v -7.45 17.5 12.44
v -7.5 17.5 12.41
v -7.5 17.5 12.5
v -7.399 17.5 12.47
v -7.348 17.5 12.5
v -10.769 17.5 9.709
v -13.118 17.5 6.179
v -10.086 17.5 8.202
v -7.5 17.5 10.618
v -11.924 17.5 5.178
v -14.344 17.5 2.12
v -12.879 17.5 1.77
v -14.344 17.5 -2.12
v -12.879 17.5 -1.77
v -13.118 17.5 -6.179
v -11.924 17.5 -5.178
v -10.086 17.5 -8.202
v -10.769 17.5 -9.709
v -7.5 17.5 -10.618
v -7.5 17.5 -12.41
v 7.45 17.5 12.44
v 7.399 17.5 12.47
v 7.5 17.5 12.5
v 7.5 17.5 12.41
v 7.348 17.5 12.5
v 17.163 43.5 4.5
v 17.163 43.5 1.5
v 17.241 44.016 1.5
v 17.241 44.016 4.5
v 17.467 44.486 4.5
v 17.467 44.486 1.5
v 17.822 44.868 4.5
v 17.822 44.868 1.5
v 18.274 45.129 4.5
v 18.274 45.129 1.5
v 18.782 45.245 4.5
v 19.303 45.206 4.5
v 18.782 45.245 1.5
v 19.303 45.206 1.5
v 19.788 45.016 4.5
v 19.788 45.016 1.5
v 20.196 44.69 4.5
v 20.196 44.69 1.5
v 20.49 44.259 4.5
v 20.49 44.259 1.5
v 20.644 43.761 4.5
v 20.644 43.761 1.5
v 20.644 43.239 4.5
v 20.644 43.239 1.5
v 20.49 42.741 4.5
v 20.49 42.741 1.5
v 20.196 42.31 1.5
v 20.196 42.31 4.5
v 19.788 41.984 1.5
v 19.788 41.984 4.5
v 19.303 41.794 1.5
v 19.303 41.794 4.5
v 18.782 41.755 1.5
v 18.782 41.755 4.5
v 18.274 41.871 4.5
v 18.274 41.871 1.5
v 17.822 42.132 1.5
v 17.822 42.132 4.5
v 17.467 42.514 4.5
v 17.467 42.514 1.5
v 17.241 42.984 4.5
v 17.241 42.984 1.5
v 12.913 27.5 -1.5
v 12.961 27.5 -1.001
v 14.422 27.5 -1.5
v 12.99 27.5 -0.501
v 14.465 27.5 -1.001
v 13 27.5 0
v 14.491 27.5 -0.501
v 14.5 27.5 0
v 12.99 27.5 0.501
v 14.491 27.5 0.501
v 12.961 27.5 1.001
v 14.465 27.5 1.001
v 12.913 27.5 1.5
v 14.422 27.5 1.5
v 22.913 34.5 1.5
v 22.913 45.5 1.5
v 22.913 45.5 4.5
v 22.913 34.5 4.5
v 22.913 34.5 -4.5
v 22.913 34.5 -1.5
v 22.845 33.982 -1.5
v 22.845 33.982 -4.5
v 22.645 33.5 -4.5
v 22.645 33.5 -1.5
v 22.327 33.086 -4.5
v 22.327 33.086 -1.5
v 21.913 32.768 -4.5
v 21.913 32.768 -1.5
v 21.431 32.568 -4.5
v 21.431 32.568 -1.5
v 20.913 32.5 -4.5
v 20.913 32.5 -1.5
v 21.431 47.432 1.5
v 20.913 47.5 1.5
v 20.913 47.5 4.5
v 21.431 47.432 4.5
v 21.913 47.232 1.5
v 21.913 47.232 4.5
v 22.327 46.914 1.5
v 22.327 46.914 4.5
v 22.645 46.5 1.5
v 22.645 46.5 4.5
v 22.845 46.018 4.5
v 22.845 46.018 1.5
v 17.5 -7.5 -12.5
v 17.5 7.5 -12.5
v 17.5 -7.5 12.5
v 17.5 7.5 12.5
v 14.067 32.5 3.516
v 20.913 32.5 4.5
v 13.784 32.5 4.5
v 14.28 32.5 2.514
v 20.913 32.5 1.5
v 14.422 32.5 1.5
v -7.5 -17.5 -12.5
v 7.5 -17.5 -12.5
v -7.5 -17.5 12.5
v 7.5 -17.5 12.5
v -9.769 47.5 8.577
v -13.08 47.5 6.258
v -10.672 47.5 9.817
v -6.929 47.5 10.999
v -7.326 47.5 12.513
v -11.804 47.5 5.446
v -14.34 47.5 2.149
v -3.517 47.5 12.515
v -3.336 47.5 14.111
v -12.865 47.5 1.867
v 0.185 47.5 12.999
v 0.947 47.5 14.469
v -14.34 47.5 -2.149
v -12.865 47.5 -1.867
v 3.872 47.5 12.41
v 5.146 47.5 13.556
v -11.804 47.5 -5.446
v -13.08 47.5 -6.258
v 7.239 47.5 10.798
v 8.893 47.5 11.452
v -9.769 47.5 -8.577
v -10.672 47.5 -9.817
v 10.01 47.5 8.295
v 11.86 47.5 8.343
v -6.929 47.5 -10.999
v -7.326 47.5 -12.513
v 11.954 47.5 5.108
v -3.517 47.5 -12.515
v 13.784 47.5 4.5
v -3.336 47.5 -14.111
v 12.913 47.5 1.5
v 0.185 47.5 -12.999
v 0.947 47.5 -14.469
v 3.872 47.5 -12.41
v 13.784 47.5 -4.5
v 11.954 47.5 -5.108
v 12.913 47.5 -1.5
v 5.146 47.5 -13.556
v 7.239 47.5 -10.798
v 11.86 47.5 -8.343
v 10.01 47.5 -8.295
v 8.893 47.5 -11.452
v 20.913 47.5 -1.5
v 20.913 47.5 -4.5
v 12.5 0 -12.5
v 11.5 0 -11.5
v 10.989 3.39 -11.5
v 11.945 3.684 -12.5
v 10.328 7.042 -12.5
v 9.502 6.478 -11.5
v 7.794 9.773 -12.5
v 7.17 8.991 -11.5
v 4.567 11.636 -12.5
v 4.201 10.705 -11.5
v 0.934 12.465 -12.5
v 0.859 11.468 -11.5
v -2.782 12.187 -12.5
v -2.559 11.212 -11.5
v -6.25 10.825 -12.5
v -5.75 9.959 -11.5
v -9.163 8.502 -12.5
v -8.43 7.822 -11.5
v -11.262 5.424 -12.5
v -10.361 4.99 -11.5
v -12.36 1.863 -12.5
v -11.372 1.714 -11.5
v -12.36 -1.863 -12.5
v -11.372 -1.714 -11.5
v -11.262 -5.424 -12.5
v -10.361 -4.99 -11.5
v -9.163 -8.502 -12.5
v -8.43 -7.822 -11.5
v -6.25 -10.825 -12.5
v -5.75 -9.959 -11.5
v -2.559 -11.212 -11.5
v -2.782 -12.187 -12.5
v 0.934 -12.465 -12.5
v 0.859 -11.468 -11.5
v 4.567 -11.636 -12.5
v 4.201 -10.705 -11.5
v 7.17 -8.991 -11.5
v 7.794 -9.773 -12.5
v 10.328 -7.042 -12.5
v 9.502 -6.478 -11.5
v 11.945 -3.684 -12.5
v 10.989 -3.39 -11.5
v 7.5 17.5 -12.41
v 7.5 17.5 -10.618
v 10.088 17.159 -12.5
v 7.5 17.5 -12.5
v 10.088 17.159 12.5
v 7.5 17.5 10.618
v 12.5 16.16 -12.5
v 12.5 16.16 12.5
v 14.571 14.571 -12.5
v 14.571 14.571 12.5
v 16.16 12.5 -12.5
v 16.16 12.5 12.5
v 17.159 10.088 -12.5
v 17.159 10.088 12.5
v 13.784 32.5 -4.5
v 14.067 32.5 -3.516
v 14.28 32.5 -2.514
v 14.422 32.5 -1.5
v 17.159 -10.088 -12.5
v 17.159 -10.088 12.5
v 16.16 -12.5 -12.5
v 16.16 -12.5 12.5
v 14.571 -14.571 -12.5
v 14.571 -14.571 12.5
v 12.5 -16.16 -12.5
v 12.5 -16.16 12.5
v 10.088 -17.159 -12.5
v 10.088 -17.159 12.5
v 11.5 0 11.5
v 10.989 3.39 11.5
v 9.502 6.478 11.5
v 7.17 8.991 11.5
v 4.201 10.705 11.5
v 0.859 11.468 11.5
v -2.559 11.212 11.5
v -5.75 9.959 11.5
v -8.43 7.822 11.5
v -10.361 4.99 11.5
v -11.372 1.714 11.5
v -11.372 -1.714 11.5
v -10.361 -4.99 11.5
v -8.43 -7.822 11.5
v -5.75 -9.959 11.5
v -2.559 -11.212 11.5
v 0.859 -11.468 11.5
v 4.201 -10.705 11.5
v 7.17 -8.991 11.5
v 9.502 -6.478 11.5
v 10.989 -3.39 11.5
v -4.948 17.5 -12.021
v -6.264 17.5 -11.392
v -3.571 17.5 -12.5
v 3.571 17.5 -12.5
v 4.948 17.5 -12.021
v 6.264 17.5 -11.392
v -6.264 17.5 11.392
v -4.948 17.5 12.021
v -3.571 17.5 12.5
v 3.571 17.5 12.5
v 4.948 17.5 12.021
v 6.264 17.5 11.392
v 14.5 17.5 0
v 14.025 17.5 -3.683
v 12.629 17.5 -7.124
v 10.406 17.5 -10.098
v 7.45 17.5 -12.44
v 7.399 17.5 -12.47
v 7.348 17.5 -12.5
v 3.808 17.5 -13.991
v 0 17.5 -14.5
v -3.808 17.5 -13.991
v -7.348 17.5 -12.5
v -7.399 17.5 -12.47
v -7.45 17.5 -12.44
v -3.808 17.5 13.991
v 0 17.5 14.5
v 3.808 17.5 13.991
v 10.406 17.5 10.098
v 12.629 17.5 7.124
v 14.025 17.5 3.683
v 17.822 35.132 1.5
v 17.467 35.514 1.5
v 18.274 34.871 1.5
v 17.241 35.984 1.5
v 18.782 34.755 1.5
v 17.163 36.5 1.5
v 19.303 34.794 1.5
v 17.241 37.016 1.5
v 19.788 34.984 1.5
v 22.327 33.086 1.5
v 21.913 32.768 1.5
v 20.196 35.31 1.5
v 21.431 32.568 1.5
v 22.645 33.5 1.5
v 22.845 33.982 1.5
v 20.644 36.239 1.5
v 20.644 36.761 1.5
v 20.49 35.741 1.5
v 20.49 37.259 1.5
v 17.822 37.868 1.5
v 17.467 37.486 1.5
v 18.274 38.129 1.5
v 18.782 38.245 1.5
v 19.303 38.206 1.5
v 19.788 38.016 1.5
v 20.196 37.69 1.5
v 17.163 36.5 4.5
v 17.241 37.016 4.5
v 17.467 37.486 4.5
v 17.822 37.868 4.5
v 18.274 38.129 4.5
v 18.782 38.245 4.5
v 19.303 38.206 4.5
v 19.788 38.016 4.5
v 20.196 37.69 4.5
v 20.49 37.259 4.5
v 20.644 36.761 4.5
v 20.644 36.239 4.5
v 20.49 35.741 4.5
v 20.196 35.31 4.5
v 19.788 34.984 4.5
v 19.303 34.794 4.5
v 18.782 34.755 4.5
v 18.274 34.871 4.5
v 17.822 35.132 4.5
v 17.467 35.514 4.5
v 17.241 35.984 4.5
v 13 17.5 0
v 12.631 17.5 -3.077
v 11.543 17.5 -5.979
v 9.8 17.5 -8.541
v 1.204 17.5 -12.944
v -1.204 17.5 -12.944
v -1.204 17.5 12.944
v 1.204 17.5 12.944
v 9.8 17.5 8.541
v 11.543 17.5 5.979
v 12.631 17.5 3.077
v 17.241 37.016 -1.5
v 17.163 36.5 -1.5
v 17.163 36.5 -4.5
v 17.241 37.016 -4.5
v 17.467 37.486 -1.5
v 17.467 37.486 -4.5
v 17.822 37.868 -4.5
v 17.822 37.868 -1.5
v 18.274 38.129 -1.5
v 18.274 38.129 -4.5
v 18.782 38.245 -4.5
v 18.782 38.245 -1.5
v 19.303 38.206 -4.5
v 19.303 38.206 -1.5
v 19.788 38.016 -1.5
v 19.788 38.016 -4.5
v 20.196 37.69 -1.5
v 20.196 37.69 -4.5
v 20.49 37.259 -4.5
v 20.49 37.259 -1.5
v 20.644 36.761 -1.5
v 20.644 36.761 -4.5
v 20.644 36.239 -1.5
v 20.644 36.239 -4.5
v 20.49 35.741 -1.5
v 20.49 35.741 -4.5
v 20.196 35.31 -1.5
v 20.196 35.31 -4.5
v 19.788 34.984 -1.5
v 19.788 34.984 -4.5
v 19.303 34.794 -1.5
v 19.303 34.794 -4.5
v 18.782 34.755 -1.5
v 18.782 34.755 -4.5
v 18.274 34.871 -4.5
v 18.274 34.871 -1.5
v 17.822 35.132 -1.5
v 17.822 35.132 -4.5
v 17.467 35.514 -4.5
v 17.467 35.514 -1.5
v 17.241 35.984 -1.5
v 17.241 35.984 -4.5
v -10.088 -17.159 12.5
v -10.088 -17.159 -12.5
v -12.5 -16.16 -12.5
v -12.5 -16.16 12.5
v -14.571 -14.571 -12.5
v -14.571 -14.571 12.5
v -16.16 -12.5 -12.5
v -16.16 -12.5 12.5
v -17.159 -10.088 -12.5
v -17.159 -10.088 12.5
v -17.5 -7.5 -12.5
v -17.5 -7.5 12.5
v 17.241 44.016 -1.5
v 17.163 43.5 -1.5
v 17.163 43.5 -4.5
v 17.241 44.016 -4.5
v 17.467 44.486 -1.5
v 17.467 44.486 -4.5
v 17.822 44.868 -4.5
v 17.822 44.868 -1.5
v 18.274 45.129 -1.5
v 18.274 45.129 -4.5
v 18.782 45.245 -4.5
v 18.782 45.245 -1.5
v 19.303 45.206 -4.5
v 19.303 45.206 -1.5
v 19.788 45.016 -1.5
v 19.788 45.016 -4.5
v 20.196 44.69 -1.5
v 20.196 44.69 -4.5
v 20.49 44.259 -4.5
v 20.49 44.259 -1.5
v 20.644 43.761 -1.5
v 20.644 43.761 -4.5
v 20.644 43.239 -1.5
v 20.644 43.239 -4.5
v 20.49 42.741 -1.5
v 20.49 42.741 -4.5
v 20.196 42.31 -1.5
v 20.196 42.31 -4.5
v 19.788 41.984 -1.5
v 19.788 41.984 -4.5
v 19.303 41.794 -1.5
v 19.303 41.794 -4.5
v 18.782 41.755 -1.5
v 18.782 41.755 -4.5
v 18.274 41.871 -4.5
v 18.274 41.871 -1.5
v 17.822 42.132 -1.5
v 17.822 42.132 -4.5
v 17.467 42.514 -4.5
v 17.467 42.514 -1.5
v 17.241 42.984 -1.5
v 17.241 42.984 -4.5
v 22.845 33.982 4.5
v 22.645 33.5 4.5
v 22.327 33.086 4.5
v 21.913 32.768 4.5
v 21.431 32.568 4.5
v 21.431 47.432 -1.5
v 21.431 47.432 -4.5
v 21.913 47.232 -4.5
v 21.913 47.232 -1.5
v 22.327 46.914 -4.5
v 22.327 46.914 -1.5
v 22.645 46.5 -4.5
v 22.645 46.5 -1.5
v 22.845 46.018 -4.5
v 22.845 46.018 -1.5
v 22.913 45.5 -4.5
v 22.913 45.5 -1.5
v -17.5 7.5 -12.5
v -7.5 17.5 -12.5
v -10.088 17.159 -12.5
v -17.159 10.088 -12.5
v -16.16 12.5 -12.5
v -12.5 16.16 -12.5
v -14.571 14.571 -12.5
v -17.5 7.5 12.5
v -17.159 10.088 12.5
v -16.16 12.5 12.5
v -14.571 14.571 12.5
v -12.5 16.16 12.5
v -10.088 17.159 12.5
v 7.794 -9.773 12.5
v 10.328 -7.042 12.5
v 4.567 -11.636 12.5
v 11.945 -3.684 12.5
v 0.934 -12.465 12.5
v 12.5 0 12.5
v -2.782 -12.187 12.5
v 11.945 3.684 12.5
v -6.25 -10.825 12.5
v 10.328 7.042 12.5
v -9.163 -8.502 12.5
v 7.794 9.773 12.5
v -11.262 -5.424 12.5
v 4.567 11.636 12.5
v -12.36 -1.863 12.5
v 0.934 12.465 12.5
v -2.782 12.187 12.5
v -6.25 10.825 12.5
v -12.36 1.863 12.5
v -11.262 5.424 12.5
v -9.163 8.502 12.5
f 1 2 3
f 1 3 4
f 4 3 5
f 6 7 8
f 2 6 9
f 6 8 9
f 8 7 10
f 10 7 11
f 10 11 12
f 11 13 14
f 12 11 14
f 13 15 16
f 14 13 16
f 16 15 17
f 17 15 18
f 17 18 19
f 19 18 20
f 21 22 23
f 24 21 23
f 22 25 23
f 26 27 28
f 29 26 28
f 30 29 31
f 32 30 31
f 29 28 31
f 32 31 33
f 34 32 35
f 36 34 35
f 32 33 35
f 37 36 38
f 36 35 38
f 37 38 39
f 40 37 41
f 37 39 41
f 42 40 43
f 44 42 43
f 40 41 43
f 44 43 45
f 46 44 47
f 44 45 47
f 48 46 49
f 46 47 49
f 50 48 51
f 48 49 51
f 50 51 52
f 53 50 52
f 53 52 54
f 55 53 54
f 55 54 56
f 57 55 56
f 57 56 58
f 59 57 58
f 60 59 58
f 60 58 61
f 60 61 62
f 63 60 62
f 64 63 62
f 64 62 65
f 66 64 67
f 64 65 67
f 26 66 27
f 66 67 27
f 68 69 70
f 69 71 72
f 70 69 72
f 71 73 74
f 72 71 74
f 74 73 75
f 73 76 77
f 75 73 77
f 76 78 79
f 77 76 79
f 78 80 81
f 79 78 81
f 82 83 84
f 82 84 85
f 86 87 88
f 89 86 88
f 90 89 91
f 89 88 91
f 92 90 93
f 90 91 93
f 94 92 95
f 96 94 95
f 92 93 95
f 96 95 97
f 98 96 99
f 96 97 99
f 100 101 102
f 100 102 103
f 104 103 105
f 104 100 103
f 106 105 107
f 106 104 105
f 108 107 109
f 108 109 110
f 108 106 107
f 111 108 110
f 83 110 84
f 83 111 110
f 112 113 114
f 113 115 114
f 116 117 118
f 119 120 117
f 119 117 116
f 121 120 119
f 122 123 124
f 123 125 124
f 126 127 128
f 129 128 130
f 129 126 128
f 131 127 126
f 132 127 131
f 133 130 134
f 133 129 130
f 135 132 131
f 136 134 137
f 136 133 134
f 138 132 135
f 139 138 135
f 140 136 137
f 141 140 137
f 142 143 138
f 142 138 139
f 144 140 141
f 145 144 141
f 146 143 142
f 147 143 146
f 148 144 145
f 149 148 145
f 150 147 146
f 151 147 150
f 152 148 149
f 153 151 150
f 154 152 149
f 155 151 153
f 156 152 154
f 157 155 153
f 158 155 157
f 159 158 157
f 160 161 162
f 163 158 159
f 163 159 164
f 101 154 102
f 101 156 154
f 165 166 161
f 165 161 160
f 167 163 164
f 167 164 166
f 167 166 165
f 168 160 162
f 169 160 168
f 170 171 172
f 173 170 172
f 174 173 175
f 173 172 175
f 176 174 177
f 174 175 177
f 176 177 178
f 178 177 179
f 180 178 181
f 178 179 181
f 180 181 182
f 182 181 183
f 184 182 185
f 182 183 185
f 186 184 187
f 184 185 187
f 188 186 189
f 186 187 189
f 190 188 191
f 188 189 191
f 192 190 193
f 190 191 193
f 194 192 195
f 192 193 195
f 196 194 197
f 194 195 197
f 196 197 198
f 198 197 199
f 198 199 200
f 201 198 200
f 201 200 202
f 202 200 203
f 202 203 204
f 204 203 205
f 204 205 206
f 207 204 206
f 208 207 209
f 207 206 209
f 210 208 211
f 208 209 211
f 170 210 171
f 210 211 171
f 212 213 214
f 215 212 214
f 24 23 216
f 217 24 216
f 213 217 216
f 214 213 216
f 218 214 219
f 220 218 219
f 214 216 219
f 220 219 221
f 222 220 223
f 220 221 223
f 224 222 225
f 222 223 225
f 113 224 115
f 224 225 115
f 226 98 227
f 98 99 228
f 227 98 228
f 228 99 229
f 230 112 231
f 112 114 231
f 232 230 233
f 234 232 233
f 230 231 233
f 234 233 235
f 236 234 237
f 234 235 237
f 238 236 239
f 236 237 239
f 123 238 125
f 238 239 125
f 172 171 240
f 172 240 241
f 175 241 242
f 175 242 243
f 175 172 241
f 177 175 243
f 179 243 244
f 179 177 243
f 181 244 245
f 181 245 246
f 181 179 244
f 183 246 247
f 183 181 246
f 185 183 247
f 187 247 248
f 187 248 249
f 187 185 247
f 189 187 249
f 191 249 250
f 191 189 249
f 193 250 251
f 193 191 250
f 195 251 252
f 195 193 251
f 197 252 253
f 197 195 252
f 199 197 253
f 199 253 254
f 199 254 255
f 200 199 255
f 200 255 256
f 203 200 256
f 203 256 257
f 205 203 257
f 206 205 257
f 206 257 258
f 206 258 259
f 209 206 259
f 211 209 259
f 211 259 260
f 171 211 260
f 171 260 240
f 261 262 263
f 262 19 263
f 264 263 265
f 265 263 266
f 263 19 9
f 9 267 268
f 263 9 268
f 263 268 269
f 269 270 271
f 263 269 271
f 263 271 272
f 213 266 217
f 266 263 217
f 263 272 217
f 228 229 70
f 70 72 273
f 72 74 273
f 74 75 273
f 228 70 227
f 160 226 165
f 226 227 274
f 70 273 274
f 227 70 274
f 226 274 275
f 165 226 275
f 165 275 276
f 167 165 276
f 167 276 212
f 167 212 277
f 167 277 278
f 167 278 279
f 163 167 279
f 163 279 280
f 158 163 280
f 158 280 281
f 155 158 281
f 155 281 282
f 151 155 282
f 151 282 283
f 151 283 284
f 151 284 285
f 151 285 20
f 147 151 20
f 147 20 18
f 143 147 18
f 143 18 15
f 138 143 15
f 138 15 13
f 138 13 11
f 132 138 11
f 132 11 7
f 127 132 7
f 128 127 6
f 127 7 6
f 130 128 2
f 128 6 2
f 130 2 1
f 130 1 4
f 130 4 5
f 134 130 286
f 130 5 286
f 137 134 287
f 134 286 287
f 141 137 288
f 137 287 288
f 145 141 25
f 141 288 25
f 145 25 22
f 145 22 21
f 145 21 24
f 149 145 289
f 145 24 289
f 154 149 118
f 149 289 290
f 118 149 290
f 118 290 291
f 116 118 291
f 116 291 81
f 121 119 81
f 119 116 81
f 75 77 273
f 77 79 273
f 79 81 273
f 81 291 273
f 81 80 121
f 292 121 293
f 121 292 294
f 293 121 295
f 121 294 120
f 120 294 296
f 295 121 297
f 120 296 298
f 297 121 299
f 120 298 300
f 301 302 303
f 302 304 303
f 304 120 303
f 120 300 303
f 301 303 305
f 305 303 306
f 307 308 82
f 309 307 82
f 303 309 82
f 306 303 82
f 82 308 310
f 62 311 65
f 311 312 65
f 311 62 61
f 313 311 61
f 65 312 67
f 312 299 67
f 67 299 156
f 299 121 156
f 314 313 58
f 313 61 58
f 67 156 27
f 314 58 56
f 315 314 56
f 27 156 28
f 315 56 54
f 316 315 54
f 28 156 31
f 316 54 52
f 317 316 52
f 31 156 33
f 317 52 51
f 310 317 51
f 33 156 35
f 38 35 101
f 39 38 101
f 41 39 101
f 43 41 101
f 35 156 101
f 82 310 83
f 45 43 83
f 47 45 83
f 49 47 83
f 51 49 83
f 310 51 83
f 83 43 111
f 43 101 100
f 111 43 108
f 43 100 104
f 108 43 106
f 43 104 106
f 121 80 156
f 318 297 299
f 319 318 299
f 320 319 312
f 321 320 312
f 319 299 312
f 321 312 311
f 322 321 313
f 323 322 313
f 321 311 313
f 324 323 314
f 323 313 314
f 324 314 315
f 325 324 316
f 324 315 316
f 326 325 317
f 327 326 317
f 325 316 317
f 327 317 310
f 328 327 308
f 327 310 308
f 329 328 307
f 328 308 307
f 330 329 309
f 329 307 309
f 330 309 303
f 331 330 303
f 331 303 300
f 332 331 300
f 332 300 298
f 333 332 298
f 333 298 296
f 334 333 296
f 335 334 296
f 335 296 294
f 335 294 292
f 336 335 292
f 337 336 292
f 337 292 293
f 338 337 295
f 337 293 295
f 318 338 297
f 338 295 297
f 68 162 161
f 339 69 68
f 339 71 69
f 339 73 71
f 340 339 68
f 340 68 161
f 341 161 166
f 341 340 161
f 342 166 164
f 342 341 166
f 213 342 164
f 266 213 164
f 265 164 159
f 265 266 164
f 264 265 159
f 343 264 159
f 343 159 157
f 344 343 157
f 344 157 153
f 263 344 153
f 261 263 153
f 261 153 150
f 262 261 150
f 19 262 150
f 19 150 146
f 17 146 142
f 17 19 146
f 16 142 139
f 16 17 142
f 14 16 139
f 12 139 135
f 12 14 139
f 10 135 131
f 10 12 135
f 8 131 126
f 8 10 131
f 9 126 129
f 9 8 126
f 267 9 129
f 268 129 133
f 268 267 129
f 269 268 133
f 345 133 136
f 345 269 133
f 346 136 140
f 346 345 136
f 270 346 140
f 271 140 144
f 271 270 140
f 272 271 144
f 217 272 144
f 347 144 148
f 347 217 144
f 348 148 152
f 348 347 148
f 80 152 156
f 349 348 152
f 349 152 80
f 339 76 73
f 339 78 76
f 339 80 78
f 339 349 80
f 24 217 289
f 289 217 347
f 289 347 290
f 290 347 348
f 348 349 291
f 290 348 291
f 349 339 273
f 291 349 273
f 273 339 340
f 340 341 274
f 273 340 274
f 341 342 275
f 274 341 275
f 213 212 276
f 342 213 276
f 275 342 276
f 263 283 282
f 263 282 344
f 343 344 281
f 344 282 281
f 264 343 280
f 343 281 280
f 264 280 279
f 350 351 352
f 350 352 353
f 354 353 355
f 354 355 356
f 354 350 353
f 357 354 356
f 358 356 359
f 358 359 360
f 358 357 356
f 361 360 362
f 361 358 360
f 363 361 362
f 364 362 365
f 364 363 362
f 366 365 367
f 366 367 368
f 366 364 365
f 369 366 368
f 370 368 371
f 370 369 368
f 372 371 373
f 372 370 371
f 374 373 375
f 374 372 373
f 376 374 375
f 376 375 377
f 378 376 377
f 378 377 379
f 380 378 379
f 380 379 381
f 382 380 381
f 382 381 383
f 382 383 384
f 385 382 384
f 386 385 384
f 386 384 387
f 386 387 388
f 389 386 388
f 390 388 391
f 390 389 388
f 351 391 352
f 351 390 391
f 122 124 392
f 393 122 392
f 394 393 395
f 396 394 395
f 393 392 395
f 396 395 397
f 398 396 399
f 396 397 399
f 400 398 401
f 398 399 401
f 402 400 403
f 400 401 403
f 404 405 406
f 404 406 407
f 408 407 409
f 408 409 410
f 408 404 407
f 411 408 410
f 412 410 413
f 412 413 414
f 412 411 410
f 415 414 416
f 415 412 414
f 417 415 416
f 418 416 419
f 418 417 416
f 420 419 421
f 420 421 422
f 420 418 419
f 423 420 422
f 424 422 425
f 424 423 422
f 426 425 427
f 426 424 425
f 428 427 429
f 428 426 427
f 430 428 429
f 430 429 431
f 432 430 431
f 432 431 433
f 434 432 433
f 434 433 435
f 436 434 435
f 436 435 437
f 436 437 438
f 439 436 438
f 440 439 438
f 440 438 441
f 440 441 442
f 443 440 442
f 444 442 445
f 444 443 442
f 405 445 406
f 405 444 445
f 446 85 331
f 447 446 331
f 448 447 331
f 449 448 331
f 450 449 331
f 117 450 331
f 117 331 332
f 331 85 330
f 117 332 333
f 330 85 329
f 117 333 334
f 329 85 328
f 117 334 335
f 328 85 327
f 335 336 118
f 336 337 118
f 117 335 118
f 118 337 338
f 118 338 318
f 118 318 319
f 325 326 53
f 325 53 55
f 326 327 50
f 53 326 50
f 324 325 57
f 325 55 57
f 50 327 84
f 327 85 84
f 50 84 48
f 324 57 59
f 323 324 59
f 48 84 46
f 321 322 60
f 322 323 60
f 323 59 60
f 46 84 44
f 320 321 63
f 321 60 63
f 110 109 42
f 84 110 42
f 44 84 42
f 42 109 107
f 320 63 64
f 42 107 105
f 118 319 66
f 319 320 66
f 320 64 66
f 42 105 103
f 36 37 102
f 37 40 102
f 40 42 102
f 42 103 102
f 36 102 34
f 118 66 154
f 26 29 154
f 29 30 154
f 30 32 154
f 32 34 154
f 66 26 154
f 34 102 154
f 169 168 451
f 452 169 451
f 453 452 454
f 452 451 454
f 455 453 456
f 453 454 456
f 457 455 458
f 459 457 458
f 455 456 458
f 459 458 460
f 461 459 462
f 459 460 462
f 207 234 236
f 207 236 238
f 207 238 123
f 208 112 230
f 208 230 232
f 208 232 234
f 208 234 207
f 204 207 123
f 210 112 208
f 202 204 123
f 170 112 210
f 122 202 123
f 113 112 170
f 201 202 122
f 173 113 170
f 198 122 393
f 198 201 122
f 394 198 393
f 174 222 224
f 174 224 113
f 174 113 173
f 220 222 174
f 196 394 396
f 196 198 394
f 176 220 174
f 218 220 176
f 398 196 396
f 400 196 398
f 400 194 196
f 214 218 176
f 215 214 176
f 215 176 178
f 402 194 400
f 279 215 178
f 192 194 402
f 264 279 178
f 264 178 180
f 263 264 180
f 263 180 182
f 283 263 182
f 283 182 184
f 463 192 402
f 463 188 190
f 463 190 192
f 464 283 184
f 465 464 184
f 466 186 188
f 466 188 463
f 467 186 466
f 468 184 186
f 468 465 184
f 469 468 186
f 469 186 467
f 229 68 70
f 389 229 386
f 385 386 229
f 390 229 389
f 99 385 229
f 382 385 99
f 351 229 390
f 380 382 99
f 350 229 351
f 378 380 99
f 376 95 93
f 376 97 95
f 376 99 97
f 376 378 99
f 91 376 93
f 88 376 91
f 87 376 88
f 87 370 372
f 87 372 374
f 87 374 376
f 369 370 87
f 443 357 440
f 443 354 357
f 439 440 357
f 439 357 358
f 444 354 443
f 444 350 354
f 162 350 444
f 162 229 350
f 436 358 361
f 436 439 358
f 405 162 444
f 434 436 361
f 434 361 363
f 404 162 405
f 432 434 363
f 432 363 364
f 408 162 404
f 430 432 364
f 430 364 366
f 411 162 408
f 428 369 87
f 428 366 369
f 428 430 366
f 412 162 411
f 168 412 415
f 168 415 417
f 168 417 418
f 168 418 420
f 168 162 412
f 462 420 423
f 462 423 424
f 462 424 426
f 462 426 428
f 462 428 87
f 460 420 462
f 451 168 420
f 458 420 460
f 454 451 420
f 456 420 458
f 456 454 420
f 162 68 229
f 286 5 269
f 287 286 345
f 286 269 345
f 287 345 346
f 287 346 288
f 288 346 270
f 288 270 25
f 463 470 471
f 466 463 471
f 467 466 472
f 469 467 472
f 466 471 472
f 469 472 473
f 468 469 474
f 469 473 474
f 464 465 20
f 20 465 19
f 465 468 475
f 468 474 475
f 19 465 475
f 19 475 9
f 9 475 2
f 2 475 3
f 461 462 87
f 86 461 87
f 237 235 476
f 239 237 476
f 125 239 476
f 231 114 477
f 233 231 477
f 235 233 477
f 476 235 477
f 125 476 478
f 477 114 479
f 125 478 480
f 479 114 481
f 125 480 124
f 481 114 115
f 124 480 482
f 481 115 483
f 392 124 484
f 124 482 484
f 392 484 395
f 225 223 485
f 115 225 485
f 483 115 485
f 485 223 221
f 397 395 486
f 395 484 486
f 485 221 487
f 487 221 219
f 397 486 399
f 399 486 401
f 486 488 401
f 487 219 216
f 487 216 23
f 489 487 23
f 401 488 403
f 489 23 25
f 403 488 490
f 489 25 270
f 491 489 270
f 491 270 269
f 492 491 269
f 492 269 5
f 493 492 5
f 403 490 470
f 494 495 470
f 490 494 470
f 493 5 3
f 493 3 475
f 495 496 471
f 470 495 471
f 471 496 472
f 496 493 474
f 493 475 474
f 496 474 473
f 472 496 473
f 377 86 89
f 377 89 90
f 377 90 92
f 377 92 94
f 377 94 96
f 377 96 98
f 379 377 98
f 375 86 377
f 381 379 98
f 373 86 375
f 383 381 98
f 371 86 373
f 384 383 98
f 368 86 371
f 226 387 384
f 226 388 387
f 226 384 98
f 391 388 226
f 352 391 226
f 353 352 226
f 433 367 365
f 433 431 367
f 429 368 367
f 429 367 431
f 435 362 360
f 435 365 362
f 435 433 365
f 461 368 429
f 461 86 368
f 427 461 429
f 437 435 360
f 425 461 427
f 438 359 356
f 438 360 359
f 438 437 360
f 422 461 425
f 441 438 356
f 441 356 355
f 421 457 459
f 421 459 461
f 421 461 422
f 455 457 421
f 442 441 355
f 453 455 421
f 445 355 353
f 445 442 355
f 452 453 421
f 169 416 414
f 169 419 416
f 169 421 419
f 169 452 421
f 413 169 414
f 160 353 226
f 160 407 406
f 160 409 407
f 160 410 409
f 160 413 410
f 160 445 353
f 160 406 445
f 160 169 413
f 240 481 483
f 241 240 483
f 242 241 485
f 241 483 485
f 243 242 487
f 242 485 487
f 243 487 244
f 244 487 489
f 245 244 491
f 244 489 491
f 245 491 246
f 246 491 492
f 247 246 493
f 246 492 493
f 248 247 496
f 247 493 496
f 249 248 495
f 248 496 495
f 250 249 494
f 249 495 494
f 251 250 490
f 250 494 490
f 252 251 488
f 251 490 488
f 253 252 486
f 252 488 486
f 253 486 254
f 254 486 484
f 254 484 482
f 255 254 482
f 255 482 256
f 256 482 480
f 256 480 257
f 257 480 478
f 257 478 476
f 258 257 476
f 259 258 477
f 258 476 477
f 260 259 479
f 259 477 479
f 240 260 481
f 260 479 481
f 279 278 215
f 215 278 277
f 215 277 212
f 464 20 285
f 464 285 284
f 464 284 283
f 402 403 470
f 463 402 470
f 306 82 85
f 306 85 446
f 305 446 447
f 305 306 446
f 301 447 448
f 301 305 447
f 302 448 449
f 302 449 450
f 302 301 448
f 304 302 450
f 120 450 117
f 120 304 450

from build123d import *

# Parameters (mm, degrees)
SKETCH2_R           = 11.5
BOSS_EXTRUDE1_DEPTH = 12.5
SKETCH4_R           = 14.5
SKETCH4_R_2         = 13
EXTRUDE_THIN1_DEPTH = 30
SKETCH5_W           = 12.460030261
SKETCH5_H           = 20
CUT_EXTRUDE1_DEPTH  = 1.5
SKETCH8_R           = 1.75
BOSS_EXTRUDE2_DEPTH = 3
CHAMFER1_SIZE       = 1


with BuildPart() as part:
    # Sketch2 → Boss-Extrude1 (new, symmetric)
    with BuildSketch(Plane.XY):
        with BuildLine():
            Line((-7.5, 17.5), (7.5, 17.5))
            ThreePointArc((7.5, 17.5), (14.571067812, 14.571067812), (17.5, 7.5))
            Line((17.5, 7.5), (17.5, -7.5))
            ThreePointArc((17.5, -7.5), (14.571067812, -14.571067812), (7.5, -17.5))
            Line((7.5, -17.5), (-7.5, -17.5))
            ThreePointArc((-7.5, -17.5), (-14.571067812, -14.571067812), (-17.5, -7.5))
            Line((-17.5, -7.5), (-17.5, 7.5))
            ThreePointArc((-17.5, 7.5), (-14.571067812, 14.571067812), (-7.5, 17.5))
        make_face()
        Circle(SKETCH2_R, mode=Mode.SUBTRACT)
    extrude(amount=BOSS_EXTRUDE1_DEPTH, both=True)

    # Sketch4 → Extrude-Thin1 (add)
    with BuildSketch(Plane(origin=(0, 17.5, 0), x_dir=(1, 0, 0), z_dir=(0, 1, 0))):
        Circle(SKETCH4_R)
        Circle(SKETCH4_R_2, mode=Mode.SUBTRACT)
    extrude(amount=EXTRUDE_THIN1_DEPTH)

    # Sketch5 → Cut-Extrude1 (cut, symmetric)
    with BuildSketch(Plane.XY):
        with Locations((15.450437523, 37.5)):
            Rectangle(SKETCH5_W, SKETCH5_H)
    extrude(amount=CUT_EXTRUDE1_DEPTH, both=True, mode=Mode.SUBTRACT)

    # Sketch8 → Boss-Extrude2 (add)
    with BuildSketch(Plane(origin=(0, 0, 1.5), x_dir=(-1, 0, 0), z_dir=(0, 0, -1))):
        with BuildLine():
            Line((-12.91317157, 47.5), (-20.91317157, 47.5))
            ThreePointArc((-20.91317157, 47.5), (-22.327385133, 46.914213562), (-22.91317157, 45.5))
            Line((-22.91317157, 45.5), (-22.91317157, 34.5))
            ThreePointArc((-22.91317157, 34.5), (-22.327385133, 33.085786438), (-20.91317157, 32.5))
            Line((-20.91317157, 32.5), (-12.91317157, 32.5))
            Line((-12.91317157, 32.5), (-12.91317157, 47.5))
        make_face()
        with Locations((-18.91317157, 43.5)):
            Circle(SKETCH8_R, mode=Mode.SUBTRACT)
        with Locations((-18.91317157, 36.5)):
            Circle(SKETCH8_R, mode=Mode.SUBTRACT)
    boss_extrude2 = extrude(amount=-BOSS_EXTRUDE2_DEPTH)

    # Mirror1: Boss-Extrude2 across plane
    add(boss_extrude2.mirror(Plane.XY))

    # Chamfer1
    chamfer1_edges = [part.edges().sort_by_distance(p)[0] for p in [
        (-11.5, 0, -12.5),
        (-11.5, 0, 12.5),
    ]]
    chamfer(chamfer1_edges, length=CHAMFER1_SIZE)


solid = part.part
